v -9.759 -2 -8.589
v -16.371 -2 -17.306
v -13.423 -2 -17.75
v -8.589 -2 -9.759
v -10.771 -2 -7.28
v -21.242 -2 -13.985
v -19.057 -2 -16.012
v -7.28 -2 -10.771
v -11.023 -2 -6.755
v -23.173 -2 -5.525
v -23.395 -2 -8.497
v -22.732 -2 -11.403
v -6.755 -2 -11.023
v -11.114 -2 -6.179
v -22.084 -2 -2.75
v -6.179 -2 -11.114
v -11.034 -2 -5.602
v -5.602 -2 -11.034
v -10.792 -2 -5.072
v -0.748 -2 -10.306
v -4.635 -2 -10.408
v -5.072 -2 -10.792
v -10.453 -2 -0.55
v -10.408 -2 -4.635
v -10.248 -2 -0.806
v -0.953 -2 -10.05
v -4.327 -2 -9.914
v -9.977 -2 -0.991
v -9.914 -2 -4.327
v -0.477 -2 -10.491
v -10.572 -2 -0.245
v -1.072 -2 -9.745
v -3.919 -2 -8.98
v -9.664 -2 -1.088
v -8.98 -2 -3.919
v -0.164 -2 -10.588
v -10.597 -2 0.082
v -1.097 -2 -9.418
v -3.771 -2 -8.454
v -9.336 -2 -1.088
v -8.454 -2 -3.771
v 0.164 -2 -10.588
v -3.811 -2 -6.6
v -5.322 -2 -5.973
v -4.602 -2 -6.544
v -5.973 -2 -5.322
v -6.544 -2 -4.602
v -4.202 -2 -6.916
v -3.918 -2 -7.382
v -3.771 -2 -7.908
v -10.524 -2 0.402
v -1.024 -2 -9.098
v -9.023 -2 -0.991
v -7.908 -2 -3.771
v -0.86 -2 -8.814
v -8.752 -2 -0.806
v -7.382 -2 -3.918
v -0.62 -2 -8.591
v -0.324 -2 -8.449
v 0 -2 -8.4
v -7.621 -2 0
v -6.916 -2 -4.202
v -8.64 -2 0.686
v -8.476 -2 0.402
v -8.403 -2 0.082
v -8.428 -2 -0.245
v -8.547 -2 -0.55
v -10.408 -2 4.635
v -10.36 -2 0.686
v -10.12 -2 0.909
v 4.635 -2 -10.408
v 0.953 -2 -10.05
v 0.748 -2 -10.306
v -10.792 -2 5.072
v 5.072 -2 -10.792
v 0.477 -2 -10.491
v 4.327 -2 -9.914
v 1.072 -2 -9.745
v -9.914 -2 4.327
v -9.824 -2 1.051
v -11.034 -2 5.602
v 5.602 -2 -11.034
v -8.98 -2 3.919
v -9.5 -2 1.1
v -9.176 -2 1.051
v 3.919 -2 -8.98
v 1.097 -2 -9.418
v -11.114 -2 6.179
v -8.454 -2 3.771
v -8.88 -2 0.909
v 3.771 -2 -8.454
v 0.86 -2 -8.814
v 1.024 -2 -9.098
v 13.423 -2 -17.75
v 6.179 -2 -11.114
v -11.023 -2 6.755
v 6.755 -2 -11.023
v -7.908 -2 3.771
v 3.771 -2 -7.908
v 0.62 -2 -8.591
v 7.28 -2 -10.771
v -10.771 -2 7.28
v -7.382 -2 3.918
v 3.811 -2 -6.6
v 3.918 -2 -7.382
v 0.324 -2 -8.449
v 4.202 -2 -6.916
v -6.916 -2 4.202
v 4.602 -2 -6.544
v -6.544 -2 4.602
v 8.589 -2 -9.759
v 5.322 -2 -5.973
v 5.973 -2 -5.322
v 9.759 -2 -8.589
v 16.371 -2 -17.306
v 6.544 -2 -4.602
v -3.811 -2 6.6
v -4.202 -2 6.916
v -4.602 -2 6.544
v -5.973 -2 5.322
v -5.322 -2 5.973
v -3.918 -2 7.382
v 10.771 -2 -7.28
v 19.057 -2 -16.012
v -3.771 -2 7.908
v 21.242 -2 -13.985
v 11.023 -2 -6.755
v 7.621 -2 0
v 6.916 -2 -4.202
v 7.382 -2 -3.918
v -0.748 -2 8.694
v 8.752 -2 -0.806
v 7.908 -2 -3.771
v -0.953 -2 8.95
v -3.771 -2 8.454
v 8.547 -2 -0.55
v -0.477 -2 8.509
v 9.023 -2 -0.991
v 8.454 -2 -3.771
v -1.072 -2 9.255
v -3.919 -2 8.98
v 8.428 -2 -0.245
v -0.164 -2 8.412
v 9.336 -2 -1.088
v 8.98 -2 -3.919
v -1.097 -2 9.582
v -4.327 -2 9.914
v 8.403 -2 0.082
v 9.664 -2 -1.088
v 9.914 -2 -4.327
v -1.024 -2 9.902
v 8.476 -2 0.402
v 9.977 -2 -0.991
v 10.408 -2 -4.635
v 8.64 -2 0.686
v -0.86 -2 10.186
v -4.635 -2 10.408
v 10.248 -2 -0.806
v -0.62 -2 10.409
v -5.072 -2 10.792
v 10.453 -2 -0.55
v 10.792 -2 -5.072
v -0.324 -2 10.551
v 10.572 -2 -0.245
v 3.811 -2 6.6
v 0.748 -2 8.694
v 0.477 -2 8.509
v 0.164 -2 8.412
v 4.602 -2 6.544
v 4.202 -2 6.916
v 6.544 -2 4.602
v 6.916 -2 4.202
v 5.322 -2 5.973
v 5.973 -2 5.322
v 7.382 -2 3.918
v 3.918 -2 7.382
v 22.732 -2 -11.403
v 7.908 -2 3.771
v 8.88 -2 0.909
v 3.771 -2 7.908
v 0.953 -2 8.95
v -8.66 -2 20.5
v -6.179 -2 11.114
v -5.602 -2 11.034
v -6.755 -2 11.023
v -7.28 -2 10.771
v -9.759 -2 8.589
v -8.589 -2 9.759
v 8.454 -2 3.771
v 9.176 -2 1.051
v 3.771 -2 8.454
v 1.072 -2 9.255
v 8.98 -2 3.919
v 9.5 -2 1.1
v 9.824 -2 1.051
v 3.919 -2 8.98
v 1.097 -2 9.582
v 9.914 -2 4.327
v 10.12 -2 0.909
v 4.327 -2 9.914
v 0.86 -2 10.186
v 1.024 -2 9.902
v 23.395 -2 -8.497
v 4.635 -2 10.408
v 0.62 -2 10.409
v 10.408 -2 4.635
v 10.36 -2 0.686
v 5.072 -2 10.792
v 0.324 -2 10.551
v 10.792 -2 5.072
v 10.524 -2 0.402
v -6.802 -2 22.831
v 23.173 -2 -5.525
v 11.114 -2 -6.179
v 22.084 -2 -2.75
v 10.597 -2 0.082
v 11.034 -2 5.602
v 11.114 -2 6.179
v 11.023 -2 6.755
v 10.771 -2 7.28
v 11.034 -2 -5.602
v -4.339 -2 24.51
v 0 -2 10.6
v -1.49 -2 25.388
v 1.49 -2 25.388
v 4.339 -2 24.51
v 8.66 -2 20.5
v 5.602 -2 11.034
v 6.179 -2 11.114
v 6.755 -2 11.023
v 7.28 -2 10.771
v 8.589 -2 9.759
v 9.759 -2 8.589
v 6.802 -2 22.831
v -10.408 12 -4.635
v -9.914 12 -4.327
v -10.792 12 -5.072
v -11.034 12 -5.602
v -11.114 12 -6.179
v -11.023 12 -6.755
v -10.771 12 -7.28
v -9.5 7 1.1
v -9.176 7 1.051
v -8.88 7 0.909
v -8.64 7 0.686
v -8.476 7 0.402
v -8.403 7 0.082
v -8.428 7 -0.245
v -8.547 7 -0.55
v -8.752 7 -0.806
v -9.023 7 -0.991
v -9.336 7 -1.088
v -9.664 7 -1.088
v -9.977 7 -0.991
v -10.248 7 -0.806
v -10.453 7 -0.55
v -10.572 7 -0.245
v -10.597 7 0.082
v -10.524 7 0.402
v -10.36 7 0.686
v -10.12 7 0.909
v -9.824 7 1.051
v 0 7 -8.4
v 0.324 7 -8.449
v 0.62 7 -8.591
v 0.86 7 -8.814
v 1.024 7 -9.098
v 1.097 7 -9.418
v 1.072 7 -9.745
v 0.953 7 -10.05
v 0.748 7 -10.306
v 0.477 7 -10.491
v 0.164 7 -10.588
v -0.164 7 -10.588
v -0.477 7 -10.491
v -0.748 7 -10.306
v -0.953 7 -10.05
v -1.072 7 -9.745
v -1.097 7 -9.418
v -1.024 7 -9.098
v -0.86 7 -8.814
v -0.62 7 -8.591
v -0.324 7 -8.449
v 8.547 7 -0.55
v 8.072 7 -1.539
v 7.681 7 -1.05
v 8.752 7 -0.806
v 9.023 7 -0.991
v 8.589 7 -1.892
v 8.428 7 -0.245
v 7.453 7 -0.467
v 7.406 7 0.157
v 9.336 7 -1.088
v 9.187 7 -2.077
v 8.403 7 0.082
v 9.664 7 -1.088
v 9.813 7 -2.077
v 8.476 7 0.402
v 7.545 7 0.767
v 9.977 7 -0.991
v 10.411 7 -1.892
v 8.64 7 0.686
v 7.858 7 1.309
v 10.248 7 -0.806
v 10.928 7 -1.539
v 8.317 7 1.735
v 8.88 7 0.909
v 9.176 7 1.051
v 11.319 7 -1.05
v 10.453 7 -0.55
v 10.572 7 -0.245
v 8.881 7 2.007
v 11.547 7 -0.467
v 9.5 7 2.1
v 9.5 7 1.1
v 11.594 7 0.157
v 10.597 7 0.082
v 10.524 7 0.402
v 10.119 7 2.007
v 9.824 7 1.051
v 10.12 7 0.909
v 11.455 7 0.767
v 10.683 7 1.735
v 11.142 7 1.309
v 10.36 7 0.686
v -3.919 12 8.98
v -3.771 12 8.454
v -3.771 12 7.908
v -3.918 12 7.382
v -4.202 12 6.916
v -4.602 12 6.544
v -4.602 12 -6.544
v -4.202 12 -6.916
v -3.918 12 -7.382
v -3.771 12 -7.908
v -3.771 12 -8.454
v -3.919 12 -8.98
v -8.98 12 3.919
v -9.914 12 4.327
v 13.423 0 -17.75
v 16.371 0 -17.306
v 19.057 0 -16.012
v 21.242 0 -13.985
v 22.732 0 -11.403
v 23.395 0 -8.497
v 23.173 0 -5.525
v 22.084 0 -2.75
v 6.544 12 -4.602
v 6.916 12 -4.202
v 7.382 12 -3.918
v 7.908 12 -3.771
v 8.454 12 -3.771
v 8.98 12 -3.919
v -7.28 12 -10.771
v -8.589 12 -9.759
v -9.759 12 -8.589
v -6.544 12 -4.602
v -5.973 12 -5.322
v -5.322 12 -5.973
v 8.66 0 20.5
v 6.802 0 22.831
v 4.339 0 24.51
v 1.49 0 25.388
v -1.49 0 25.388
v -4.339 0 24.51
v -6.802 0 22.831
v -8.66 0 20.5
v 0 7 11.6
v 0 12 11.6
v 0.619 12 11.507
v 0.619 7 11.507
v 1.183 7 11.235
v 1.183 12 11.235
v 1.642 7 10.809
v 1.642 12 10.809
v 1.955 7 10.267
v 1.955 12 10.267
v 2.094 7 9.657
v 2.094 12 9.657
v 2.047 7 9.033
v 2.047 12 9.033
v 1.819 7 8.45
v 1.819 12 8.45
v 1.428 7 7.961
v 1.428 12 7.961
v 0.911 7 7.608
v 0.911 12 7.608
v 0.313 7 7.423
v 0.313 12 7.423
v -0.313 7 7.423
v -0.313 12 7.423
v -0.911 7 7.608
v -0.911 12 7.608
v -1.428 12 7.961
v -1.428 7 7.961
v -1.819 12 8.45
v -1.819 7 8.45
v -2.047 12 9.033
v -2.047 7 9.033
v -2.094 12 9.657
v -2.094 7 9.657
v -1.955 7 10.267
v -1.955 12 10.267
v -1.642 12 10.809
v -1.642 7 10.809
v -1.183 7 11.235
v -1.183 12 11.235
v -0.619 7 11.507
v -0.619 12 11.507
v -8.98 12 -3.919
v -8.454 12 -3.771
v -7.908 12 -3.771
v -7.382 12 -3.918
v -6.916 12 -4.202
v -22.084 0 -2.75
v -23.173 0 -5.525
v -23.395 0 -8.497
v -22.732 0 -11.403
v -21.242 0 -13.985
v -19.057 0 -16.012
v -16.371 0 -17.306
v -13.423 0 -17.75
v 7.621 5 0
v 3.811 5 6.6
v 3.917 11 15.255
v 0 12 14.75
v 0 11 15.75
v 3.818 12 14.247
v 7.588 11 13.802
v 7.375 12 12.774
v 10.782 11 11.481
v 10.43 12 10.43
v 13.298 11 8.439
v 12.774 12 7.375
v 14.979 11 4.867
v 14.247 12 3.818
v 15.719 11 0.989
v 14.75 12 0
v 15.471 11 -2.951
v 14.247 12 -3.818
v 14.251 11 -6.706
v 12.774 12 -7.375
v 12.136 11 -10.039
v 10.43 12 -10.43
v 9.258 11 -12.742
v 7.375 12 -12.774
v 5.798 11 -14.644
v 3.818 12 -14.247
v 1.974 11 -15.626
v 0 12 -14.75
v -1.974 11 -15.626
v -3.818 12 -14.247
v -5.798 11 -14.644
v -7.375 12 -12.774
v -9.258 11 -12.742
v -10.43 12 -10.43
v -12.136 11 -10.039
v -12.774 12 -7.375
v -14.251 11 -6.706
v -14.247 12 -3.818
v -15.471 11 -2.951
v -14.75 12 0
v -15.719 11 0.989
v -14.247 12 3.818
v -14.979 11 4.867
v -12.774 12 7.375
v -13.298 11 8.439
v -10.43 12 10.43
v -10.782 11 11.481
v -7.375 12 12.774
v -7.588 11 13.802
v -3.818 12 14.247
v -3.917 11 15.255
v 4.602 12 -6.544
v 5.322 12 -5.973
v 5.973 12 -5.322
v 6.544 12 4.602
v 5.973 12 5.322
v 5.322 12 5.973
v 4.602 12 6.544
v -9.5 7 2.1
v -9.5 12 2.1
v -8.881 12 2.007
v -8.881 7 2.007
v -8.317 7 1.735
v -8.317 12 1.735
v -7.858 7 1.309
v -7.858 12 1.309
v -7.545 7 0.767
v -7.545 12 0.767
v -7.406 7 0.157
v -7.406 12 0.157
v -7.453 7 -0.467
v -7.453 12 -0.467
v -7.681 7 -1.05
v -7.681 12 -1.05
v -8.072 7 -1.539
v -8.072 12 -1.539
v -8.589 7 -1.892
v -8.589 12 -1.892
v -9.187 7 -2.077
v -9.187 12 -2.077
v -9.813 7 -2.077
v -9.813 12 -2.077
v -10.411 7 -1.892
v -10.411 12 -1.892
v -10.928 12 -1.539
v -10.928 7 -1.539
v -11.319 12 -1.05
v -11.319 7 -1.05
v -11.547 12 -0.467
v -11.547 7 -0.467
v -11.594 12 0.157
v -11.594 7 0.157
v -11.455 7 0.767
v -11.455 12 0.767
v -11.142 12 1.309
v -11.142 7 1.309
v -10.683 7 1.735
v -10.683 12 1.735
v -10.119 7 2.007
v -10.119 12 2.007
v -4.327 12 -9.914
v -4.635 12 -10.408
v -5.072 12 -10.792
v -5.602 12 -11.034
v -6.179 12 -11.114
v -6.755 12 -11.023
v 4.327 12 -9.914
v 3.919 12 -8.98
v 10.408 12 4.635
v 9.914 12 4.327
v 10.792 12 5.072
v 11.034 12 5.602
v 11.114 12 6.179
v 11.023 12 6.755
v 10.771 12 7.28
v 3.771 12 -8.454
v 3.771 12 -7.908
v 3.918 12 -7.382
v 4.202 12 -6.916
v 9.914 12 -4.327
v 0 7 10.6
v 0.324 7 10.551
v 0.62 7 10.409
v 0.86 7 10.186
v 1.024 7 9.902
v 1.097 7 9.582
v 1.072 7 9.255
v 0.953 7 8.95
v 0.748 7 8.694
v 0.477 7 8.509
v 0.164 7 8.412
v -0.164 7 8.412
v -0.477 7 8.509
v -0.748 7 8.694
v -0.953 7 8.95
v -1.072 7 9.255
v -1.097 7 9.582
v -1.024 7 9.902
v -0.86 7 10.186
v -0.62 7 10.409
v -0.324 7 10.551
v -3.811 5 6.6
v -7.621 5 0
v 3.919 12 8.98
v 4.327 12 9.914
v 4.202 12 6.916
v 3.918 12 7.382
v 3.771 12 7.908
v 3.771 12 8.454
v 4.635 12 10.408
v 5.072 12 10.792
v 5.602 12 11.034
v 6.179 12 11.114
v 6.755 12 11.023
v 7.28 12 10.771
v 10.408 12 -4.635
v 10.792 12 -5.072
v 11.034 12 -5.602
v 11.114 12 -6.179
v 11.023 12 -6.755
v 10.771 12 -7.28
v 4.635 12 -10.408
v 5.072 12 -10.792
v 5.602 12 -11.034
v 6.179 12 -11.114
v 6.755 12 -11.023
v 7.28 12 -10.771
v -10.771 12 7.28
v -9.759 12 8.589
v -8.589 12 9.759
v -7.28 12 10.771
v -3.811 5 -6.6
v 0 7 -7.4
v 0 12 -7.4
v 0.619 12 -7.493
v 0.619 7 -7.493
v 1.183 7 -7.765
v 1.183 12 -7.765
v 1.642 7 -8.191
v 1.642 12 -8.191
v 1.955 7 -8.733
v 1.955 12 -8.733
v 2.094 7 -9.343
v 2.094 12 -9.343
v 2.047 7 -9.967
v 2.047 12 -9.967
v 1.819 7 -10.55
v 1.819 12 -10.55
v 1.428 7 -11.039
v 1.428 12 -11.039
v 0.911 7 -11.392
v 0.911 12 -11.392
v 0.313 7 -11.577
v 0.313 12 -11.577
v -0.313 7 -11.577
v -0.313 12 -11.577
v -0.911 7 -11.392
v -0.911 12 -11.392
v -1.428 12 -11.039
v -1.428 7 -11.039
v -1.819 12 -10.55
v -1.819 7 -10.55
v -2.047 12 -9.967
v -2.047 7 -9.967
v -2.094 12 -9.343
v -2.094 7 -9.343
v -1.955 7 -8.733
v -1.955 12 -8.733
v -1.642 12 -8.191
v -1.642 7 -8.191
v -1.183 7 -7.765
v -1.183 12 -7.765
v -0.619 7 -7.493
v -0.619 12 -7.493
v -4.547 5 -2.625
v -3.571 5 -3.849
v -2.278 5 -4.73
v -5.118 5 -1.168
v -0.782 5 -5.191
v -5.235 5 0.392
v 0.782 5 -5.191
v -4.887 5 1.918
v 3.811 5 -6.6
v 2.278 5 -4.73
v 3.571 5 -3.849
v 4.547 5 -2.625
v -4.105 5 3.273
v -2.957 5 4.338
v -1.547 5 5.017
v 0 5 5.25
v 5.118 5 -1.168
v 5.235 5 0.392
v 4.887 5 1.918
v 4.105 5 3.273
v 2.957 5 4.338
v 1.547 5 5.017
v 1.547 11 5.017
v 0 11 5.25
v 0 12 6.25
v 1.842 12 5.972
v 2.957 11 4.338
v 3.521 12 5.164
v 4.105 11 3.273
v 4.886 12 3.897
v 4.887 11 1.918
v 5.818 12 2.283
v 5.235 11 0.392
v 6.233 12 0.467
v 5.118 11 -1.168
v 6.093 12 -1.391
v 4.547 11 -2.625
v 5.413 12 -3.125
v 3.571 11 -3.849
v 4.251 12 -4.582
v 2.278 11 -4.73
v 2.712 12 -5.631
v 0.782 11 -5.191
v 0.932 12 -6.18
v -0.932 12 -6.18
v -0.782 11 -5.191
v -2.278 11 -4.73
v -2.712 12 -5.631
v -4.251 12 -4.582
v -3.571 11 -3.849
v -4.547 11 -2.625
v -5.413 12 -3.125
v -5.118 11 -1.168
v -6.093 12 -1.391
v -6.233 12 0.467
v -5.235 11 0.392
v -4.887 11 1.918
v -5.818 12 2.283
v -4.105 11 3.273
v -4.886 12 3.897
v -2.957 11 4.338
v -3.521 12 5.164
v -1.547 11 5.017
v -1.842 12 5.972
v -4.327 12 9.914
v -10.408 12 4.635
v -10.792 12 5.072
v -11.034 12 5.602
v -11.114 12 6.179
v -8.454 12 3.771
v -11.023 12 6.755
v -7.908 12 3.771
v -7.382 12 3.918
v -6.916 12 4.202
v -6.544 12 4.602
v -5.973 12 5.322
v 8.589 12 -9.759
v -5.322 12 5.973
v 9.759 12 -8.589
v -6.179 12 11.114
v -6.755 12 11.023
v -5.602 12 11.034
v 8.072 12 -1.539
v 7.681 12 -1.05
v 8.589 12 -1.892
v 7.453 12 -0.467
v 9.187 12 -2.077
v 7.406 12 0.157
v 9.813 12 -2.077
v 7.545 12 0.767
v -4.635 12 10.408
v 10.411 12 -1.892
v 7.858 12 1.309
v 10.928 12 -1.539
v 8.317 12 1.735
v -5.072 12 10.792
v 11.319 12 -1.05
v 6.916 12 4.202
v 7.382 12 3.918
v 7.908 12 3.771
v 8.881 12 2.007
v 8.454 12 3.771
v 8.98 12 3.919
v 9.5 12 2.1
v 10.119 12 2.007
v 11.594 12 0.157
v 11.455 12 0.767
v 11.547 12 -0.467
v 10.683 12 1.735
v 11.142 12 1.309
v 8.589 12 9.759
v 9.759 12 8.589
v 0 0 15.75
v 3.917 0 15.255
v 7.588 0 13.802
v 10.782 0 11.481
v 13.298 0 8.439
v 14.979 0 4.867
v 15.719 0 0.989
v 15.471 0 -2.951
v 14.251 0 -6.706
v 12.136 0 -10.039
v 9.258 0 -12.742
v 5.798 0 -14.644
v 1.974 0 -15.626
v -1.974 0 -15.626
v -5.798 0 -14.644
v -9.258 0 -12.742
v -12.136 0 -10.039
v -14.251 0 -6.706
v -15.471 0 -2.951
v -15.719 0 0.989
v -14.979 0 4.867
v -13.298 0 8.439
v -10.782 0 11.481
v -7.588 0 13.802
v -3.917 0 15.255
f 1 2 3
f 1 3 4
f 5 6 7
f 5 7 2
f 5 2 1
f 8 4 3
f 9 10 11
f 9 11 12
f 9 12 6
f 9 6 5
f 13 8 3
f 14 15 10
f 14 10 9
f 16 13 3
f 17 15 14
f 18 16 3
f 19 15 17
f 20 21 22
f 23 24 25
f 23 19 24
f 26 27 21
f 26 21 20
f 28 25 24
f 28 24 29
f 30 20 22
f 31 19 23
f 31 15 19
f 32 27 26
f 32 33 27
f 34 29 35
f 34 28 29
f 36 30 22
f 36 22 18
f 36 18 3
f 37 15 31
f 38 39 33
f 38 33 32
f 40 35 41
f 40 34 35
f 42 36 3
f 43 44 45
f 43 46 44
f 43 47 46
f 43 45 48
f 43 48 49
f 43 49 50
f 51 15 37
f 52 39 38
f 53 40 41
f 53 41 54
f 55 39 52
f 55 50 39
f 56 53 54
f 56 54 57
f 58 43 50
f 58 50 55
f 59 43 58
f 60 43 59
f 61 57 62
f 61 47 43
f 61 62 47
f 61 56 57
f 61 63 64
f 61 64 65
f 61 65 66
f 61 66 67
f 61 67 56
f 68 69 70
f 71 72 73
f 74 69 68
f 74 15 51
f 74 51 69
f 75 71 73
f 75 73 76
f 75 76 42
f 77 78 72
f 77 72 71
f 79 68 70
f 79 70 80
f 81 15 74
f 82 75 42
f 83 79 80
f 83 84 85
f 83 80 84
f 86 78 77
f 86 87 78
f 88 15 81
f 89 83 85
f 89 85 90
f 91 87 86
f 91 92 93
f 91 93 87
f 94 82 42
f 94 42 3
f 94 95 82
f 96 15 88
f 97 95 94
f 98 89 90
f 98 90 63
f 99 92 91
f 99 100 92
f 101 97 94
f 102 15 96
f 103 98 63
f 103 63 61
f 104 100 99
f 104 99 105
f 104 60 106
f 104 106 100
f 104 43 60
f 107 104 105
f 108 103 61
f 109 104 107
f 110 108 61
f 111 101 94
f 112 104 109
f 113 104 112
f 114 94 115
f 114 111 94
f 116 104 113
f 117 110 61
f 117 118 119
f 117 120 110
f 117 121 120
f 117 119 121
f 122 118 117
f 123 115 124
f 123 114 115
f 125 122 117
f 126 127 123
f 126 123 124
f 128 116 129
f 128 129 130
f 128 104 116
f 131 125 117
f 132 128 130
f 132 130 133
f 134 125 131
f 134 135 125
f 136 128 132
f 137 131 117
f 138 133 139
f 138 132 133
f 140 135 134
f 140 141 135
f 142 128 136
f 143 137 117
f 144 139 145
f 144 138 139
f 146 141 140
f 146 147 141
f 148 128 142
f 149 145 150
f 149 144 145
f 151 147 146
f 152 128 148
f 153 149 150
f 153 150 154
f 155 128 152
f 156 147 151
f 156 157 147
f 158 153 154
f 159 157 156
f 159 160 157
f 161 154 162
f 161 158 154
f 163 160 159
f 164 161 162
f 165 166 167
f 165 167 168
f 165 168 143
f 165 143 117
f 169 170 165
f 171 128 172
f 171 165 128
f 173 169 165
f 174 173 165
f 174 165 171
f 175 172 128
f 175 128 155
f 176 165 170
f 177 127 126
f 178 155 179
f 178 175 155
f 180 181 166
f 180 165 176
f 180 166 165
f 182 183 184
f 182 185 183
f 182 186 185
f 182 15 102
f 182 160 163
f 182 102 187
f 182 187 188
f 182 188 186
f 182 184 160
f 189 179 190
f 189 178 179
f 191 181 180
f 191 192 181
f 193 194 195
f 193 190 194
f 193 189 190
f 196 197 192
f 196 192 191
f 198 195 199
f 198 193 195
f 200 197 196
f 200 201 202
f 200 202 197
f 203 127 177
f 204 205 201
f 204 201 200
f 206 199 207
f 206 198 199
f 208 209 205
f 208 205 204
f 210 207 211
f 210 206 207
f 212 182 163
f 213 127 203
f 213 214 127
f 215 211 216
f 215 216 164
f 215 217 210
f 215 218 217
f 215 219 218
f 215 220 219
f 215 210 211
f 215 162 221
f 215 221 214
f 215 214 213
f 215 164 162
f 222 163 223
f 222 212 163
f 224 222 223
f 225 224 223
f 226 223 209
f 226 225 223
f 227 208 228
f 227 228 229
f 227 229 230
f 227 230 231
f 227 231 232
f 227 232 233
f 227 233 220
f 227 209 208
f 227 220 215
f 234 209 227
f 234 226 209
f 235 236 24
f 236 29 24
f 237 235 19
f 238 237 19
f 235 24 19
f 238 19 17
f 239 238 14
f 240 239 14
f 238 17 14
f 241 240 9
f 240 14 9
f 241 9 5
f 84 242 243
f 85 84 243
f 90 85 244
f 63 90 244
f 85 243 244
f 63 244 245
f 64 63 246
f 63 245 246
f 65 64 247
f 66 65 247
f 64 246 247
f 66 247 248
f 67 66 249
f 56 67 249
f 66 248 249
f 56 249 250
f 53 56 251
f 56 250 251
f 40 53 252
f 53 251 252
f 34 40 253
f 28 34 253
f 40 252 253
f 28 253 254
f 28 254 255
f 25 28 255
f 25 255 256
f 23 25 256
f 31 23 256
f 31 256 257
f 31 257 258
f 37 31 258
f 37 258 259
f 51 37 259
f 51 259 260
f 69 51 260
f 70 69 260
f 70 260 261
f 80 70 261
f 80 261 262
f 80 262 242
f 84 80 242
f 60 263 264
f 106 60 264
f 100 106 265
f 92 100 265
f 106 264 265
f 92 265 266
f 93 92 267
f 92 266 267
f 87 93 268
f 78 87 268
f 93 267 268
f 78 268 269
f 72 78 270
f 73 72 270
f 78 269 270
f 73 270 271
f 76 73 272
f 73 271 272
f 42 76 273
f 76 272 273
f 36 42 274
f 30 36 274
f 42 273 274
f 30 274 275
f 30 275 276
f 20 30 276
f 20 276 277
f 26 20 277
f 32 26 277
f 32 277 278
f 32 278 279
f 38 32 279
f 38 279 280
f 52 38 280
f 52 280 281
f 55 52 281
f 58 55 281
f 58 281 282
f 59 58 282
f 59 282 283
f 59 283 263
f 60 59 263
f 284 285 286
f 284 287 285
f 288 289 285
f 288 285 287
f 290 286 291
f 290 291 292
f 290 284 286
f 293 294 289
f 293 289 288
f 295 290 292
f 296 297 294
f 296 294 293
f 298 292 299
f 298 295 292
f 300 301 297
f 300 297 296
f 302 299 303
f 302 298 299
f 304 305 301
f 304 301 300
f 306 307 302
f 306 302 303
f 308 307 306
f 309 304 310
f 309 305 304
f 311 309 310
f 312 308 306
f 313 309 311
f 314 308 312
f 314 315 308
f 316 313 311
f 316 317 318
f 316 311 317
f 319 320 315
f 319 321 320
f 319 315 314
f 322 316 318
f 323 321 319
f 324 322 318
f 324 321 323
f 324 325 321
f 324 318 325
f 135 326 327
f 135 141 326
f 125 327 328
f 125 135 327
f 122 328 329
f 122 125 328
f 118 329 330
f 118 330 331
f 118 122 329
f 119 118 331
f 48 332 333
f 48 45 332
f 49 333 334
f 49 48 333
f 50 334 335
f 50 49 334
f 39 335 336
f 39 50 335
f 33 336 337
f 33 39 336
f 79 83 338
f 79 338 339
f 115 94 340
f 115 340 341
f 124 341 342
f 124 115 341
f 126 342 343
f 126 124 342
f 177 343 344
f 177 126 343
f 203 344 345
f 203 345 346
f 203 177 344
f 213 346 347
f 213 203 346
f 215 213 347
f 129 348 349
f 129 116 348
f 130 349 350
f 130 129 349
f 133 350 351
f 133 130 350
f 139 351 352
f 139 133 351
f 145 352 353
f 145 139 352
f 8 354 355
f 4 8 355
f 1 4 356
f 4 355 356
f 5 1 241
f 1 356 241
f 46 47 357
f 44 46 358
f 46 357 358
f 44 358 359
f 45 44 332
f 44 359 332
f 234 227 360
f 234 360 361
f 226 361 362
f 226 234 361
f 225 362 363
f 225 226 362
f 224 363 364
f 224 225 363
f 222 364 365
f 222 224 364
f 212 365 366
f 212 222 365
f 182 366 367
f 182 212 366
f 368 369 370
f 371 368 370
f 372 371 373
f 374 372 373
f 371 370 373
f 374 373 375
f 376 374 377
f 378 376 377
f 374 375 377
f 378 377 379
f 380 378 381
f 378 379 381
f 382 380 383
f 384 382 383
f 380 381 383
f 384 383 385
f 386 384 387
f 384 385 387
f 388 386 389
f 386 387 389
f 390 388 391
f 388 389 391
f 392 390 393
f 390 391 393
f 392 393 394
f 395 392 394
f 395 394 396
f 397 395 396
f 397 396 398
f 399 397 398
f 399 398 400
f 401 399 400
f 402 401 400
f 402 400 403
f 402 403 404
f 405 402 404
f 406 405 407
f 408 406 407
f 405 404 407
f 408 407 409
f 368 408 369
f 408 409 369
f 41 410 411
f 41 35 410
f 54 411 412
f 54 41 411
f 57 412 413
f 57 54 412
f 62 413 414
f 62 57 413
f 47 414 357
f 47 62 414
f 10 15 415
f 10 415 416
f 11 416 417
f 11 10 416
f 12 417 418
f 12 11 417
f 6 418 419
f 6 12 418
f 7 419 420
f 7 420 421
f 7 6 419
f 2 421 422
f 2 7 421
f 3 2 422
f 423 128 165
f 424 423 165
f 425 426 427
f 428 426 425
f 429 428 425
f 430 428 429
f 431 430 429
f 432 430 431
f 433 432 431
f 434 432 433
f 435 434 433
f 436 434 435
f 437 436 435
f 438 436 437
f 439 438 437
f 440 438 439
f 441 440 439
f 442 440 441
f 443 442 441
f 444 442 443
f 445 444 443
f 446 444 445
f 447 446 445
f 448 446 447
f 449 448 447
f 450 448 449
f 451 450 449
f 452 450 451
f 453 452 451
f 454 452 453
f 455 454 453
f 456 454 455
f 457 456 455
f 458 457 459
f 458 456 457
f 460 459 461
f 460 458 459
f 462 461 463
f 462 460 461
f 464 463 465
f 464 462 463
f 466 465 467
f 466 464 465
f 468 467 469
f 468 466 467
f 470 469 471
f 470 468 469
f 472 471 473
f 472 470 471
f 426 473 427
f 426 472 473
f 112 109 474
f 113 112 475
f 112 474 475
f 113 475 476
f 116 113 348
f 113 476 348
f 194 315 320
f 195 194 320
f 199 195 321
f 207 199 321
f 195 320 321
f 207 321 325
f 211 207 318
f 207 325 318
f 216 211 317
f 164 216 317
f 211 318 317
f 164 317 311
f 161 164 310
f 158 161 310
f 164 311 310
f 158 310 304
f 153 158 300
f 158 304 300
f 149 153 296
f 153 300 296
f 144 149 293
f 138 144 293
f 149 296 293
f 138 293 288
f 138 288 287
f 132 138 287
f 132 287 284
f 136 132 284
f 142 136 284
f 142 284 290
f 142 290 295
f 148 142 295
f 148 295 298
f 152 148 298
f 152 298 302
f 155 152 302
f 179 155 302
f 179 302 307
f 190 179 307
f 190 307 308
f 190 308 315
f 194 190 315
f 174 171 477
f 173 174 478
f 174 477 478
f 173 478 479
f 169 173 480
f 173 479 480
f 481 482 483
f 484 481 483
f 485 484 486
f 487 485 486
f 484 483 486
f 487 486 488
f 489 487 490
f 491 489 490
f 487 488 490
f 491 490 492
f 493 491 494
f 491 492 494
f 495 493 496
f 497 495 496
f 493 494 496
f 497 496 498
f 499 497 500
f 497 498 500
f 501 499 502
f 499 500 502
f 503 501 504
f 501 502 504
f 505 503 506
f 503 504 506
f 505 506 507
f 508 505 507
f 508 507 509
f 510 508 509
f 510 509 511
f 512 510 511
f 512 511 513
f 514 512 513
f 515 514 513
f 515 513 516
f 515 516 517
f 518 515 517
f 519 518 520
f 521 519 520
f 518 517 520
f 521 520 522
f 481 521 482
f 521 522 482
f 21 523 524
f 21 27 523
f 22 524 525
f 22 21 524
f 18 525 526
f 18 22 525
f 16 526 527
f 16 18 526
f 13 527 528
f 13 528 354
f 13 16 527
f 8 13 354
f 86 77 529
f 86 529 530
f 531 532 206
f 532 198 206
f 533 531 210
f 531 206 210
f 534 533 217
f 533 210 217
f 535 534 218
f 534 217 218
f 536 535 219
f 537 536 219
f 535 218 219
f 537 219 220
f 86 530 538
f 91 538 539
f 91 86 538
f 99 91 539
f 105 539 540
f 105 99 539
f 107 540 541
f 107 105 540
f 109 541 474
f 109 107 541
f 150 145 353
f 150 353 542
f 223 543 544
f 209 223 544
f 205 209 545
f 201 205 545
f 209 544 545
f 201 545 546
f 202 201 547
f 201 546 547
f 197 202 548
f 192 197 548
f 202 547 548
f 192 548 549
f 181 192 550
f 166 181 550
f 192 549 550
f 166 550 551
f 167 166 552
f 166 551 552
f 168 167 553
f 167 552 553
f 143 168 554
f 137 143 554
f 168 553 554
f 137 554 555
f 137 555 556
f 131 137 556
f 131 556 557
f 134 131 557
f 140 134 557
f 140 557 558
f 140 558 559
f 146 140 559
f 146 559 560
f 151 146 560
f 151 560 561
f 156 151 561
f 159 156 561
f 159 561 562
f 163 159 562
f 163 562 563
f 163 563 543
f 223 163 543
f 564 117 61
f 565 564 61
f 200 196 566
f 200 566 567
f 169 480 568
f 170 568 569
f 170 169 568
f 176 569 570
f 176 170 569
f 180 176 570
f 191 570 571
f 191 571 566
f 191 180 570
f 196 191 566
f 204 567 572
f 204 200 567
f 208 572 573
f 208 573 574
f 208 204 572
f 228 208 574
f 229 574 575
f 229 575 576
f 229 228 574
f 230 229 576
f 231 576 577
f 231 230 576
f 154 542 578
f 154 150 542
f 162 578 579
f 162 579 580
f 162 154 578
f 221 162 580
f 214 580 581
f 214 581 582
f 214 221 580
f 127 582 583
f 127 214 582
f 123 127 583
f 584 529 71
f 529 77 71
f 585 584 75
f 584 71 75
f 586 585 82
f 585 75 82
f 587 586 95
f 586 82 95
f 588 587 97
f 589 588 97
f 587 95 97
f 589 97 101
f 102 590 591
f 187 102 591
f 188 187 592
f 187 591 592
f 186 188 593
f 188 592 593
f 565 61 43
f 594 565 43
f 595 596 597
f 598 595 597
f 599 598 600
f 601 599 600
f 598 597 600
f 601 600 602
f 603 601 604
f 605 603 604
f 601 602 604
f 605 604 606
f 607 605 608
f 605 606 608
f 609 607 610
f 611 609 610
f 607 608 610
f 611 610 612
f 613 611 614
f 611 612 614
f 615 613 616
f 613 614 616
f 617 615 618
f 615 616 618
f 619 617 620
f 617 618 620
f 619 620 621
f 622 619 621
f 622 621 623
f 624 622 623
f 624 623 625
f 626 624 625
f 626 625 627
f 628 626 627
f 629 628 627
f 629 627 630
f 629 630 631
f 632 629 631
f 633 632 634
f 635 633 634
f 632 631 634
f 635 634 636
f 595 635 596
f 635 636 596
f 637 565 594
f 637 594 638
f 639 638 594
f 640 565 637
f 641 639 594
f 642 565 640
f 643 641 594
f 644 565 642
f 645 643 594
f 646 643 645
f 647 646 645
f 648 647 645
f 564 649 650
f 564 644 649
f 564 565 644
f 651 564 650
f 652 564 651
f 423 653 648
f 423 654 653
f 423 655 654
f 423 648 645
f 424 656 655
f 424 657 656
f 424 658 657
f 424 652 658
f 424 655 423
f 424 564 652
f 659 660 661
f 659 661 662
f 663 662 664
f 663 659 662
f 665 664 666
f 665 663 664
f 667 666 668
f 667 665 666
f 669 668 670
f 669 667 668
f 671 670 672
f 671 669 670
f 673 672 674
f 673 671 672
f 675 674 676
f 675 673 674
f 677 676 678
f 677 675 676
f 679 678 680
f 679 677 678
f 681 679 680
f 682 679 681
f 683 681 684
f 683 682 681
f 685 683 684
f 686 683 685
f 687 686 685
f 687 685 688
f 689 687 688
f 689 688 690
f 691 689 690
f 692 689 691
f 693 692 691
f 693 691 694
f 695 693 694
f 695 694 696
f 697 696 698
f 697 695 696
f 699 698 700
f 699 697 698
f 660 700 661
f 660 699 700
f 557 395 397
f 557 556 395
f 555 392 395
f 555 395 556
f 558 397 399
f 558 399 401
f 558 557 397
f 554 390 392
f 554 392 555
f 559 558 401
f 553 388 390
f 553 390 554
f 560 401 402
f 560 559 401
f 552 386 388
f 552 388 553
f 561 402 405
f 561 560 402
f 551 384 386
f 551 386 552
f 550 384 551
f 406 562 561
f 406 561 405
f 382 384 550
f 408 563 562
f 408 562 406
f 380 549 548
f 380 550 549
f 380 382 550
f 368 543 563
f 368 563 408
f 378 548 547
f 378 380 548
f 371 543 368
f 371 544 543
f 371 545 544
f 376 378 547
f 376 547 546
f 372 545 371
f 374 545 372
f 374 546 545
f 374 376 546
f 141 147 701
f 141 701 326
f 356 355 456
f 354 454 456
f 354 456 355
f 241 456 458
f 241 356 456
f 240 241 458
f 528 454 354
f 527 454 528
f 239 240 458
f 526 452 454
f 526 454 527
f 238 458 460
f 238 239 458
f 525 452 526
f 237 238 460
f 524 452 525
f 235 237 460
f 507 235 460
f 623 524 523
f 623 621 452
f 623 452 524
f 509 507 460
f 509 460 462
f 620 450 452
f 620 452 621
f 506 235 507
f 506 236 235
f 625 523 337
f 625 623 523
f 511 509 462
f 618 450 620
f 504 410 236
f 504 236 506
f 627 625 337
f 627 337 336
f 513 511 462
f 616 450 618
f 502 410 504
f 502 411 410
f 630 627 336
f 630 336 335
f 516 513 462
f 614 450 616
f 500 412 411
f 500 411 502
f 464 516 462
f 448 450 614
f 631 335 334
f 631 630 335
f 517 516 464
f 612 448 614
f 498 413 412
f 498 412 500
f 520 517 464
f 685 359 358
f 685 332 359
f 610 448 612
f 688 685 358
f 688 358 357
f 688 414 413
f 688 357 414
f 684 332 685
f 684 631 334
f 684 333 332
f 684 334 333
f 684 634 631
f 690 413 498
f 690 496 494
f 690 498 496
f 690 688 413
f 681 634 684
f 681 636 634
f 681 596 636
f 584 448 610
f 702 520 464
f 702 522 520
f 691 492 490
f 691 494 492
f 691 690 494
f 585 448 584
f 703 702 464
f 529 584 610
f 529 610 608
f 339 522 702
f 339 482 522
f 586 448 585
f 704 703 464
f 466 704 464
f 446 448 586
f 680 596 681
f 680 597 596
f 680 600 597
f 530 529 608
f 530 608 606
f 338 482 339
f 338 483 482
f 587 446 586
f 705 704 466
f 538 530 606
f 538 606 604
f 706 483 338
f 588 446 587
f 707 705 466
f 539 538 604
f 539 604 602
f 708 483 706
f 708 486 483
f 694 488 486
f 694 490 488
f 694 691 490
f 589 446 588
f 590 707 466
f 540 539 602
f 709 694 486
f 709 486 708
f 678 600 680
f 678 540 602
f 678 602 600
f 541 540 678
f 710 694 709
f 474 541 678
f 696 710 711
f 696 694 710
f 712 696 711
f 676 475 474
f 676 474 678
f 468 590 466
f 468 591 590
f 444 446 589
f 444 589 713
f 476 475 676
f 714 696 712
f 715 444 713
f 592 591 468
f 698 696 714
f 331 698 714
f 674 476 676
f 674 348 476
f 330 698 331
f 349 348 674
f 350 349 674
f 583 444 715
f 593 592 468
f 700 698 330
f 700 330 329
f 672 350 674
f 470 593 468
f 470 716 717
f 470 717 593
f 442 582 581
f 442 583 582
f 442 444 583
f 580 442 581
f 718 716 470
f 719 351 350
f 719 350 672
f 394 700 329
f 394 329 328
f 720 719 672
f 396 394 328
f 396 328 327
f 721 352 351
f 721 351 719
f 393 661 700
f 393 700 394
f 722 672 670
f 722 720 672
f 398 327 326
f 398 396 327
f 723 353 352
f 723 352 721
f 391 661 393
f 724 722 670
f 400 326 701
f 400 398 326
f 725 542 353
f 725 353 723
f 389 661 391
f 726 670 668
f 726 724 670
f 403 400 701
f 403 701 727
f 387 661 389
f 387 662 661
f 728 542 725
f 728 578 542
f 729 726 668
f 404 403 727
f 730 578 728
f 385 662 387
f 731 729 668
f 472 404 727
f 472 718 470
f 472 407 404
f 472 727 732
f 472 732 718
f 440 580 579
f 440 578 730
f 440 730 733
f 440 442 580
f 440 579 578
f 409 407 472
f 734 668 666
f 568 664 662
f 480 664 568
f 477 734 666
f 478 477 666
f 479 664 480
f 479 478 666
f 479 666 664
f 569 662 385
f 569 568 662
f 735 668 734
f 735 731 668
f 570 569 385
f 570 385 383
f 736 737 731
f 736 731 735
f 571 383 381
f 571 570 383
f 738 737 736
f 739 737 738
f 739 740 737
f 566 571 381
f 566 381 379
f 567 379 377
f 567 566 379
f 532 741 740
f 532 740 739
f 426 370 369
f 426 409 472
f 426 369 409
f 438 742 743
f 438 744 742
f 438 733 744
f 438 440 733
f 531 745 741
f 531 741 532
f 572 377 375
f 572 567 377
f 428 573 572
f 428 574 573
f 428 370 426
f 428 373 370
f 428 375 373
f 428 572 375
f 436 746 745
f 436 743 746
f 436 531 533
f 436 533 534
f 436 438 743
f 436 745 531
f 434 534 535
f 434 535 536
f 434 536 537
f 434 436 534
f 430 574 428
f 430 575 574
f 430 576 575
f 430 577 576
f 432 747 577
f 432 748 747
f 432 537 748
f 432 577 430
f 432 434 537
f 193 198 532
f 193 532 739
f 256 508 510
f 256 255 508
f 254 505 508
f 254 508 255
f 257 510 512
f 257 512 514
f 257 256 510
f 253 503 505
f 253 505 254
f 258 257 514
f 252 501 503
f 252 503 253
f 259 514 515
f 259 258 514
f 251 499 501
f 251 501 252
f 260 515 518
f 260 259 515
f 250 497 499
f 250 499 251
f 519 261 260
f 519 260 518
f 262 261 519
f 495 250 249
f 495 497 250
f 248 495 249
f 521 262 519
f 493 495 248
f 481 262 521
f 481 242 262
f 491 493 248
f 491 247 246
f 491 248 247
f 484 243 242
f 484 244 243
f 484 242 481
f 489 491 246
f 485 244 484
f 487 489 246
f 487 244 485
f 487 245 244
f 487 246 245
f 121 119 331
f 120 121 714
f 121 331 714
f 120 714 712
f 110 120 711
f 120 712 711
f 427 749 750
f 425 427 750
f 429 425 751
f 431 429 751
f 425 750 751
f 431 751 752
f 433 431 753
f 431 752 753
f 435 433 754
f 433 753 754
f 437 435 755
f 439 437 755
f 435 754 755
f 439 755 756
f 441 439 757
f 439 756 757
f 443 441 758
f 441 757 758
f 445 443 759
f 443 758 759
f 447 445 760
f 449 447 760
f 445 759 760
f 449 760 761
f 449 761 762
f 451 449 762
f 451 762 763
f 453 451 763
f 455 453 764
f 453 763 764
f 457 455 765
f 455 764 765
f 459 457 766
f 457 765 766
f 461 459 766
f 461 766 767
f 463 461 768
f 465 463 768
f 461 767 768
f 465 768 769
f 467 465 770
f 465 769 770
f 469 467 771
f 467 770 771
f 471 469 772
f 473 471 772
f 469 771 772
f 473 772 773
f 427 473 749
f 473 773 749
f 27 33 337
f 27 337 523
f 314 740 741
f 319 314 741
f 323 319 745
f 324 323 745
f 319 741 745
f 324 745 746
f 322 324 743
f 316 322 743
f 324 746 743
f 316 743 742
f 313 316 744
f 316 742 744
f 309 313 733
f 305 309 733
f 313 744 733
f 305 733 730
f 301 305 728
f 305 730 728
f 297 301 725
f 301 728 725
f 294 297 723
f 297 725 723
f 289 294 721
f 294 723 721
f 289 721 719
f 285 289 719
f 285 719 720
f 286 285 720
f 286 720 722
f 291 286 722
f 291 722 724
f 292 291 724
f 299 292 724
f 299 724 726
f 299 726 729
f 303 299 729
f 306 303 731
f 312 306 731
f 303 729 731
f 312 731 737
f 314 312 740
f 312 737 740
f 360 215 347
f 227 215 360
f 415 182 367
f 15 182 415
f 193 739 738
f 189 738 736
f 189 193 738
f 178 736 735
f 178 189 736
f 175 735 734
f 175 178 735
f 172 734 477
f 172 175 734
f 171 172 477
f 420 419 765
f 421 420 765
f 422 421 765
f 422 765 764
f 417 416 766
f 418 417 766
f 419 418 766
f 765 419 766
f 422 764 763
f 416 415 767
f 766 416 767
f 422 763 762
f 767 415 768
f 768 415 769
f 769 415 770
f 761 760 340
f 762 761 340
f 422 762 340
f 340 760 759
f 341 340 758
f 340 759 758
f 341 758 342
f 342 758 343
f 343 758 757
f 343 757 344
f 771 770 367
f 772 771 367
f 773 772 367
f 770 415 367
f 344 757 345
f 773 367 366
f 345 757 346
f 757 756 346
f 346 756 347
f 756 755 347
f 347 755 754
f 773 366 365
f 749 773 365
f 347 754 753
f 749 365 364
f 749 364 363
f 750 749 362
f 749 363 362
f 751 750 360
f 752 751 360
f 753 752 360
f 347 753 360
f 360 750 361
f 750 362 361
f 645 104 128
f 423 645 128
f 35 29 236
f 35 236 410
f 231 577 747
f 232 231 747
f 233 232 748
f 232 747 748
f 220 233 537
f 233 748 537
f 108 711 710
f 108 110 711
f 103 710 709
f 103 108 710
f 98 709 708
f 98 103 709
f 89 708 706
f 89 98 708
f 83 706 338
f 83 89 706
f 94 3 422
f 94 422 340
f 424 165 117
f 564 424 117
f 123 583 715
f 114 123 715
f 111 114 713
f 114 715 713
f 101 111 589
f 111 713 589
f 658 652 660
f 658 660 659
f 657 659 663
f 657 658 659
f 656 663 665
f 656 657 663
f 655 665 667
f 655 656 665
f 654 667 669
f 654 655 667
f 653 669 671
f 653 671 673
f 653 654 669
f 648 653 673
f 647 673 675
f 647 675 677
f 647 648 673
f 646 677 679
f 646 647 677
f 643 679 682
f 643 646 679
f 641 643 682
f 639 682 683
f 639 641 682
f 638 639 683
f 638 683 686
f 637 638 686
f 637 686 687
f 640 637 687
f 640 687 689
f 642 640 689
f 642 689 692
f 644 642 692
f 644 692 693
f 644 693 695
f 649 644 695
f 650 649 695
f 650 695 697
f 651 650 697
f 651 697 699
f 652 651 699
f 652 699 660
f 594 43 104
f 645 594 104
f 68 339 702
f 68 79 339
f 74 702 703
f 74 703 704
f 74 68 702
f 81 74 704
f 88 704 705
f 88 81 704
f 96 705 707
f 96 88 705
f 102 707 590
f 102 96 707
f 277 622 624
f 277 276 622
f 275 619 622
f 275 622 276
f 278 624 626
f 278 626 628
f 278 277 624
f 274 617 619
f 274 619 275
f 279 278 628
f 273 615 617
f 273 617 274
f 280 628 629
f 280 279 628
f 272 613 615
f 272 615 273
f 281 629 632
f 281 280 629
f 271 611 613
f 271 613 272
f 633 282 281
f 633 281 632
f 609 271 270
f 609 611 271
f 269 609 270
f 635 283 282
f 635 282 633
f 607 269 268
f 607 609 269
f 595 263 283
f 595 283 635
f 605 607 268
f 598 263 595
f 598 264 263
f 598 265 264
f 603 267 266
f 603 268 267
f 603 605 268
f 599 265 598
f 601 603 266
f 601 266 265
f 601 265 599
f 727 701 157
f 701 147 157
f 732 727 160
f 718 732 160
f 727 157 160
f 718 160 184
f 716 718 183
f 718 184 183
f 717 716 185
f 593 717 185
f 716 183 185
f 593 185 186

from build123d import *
from build123d.topology import SkipClean

# Parameters (mm, degrees)
SKETCH_1_R          = 15.75
SKETCH_1_R_2        = 5.25
EXTRUDE_1_DEPTH     = 12
EXTRUDE_START       = 2
SKETCH_2_R          = 5.25
EXTRUDE_2_DEPTH     = 2
CUT_EXTRUDE_1_DEPTH = 7
SKETCH_5_R          = 1.1
CUT_EXTRUDE_2_DEPTH = 38.348432031
SKETCH_6_R          = 2.1
CUT_EXTRUDE_3_DEPTH = 5
CHAMFER_1_SIZE      = 1
CUT_EXTRUDE_4_DEPTH = 38.348432031
FILLET_1_R          = 2


with BuildPart() as part:
    # Эскиз1 → Бобышка-Вытянуть1 (new body)
    with BuildSketch(Plane(origin=(0, 0, 0), x_dir=(1, 0, 0), z_dir=(0, 1, 0))):
        with Locations(Location((0, 0, 0), (0, 0, 270))):
            Circle(SKETCH_1_R)
        with Locations(Location((0, 0, 0), (0, 0, 270))):
            Circle(SKETCH_1_R_2, mode=Mode.SUBTRACT)
    extrude(amount=EXTRUDE_1_DEPTH)

    # Эскиз2 → Бобышка-Вытянуть2 (add)
    with SkipClean():  # the faces are left unmerged after this step: merging them gives an invalid solid
        with BuildSketch(Plane.XZ.offset(EXTRUDE_START)):
            with BuildLine():
                Line((-8.660254038, 20.5), (-22.083647797, -2.75))
                ThreePointArc((-22.083647797, -2.75), (-22.083647797, -12.75), (-13.423393759, -17.75))
                Line((-13.423393759, -17.75), (13.423393759, -17.75))
                ThreePointArc((13.423393759, -17.75), (22.083647797, -12.75), (22.083647797, -2.75))
                Line((22.083647797, -2.75), (8.660254038, 20.5))
                ThreePointArc((8.660254038, 20.5), (0, 25.5), (-8.660254038, 20.5))
            make_face()
            with Locations(Location((0, 0, 0), (0, 0, 270))):
                Circle(SKETCH_2_R, mode=Mode.SUBTRACT)
        extrude(amount=-EXTRUDE_2_DEPTH)

    # Эскиз3 → Вырез-Вытянуть1 (cut)
    with BuildSketch(Plane.XZ.offset(2)):
        Polygon((3.810511777, 6.6), (-3.810511777, 6.6), (-7.621023553, 0), (-3.810511777, -6.6), (3.810511777, -6.6), (7.621023553, 0), align=None)
    extrude(amount=-CUT_EXTRUDE_1_DEPTH, mode=Mode.SUBTRACT)

    # Эскиз5 → Вырез-Вытянуть2 (cut, through all)
    with BuildSketch(Plane(origin=(0, 12, 0), x_dir=(1, 0, 0), z_dir=(0, 1, 0))):
        with Locations(Location((0, 9.5, 0), (0, 0, 270))):
            Circle(SKETCH_5_R)
        with Locations(Location((9.5, 0, 0), (0, 0, 270))):
            Circle(SKETCH_5_R)
        with Locations(Location((0, -9.5, 0), (0, 0, 270))):
            Circle(SKETCH_5_R)
        with Locations(Location((-9.5, 0, 0), (0, 0, 270))):
            Circle(SKETCH_5_R)
    extrude(amount=-CUT_EXTRUDE_2_DEPTH, mode=Mode.SUBTRACT)

    # Эскиз6 → Вырез-Вытянуть3 (cut)
    with BuildSketch(Plane(origin=(0, 12, 0), x_dir=(1, 0, 0), z_dir=(0, 1, 0))):
        with Locations(Location((0, 9.5, 0), (0, 0, 270))):
            Circle(SKETCH_6_R)
        with Locations(Location((9.5, 0, 0), (0, 0, 270))):
            Circle(SKETCH_6_R)
        with Locations(Location((0, -9.5, 0), (0, 0, 270))):
            Circle(SKETCH_6_R)
        with Locations(Location((-9.5, 0, 0), (0, 0, 270))):
            Circle(SKETCH_6_R)
    extrude(amount=-CUT_EXTRUDE_3_DEPTH, mode=Mode.SUBTRACT)

    # Фаска1
    chamfer_1_edges = [part.edges().sort_by_distance(p)[0] for p in [
        (0, 12, -15.75),
        (0, 12, -5.25),
    ]]
    chamfer(chamfer_1_edges, length=CHAMFER_1_SIZE)

    # Эскиз7 → Вырез-Вытянуть4 (cut, through all)
    with BuildSketch(Plane(origin=(0, 12, 0), x_dir=(1, 0, 0), z_dir=(0, 1, 0))):
        with BuildLine():
            Line((5.2, 11.914696807), (3.2, 7.332121112))
            ThreePointArc((3.2, 7.332121112), (5.656854249, 5.656854249), (7.332121112, 3.2))
            Line((7.332121112, 3.2), (11.914696807, 5.2))
            ThreePointArc((11.914696807, 5.2), (9.192388155, 9.192388155), (5.2, 11.914696807))
        make_face()
        with BuildLine():
            Line((11.914696807, -5.2), (7.332121112, -3.2))
            ThreePointArc((7.332121112, -3.2), (5.656854249, -5.656854249), (3.2, -7.332121112))
            Line((3.2, -7.332121112), (5.2, -11.914696807))
            ThreePointArc((5.2, -11.914696807), (9.192388155, -9.192388155), (11.914696807, -5.2))
        make_face()
        with BuildLine():
            Line((-5.2, -11.914696807), (-3.2, -7.332121112))
            ThreePointArc((-3.2, -7.332121112), (-5.656854249, -5.656854249), (-7.332121112, -3.2))
            Line((-7.332121112, -3.2), (-11.914696807, -5.2))
            ThreePointArc((-11.914696807, -5.2), (-9.192388155, -9.192388155), (-5.2, -11.914696807))
        make_face()
        with BuildLine():
            Line((-11.914696807, 5.2), (-7.332121112, 3.2))
            ThreePointArc((-7.332121112, 3.2), (-5.656854249, 5.656854249), (-3.2, 7.332121112))
            Line((-3.2, 7.332121112), (-5.2, 11.914696807))
            ThreePointArc((-5.2, 11.914696807), (-9.192388155, 9.192388155), (-11.914696807, 5.2))
        make_face()
    extrude(amount=-CUT_EXTRUDE_4_DEPTH, mode=Mode.SUBTRACT)

    # Скругление1
    fillet_1_edges = [part.edges().sort_by_distance(p)[0] for p in [
        (-5.2, 5, -11.914696807),
        (-3.2, 5, -7.332121112),
        (-7.332121112, 5, -3.2),
        (-11.914696807, 5, -5.2),
        (-11.914696807, 5, 5.2),
        (-7.332121112, 5, 3.2),
        (-3.2, 5, 7.332121112),
        (-5.2, 5, 11.914696807),
        (5.2, 5, 11.914696807),
        (3.2, 5, 7.332121112),
        (7.332121112, 5, 3.2),
        (11.914696807, 5, 5.2),
        (11.914696807, 5, -5.2),
        (7.332121112, 5, -3.2),
        (3.2, 5, -7.332121112),
        (5.2, 5, -11.914696807),
    ]]
    fillet(fillet_1_edges, radius=FILLET_1_R)


solid = part.part
